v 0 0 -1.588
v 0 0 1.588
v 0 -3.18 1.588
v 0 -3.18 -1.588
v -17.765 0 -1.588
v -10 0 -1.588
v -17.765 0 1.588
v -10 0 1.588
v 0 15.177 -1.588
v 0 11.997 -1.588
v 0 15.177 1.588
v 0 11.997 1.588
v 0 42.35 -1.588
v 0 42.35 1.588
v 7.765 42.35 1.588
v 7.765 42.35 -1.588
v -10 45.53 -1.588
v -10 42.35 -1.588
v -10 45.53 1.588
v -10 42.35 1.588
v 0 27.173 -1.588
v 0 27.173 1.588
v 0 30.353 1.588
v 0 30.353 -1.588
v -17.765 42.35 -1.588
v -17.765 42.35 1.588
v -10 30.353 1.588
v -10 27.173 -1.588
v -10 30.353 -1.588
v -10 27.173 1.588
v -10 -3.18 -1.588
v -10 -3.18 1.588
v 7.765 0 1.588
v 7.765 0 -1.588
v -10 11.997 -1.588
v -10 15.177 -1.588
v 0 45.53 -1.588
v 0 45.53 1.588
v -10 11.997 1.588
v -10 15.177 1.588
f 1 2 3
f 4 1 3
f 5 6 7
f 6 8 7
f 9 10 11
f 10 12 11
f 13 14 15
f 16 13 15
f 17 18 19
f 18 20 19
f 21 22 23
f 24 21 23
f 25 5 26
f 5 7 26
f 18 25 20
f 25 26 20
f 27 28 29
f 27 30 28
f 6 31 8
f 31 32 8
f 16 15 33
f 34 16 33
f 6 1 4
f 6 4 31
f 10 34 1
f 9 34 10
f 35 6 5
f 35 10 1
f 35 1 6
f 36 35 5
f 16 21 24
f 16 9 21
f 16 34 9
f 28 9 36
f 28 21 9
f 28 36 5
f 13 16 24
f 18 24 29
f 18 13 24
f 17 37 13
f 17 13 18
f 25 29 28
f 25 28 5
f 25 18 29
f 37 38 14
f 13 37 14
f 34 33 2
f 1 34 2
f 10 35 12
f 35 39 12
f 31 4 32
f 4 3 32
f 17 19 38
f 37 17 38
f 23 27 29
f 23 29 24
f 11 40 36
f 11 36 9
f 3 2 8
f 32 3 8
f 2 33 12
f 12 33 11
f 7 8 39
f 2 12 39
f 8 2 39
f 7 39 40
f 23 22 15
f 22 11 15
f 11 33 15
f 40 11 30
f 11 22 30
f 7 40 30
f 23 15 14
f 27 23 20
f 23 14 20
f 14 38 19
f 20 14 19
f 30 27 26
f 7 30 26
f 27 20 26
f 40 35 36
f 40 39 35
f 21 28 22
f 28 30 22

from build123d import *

# Parameters (mm, degrees)
SKETCH1_W           = 10
SKETCH1_H           = 3.18
BOSS_EXTRUDE1_DEPTH = 1.5875


with BuildPart() as part:
    # Sketch1 → Boss-Extrude1 (new, symmetric)
    with BuildSketch(Plane.XY):
        Polygon((0, 0), (0, -3.18), (-10, -3.18), (-10, 0), (-17.765, 0), (-17.765, 42.35), (-10, 42.35), (-10, 45.53), (0, 45.53), (0, 42.35), (7.765, 42.35), (7.765, 0), align=None)
        with Locations((-5, 13.586666667)):
            Rectangle(SKETCH1_W, SKETCH1_H, mode=Mode.SUBTRACT)
        with Locations((-5, 28.763333333)):
            Rectangle(SKETCH1_W, SKETCH1_H, mode=Mode.SUBTRACT)
    extrude(amount=BOSS_EXTRUDE1_DEPTH, both=True)


solid = part.part
